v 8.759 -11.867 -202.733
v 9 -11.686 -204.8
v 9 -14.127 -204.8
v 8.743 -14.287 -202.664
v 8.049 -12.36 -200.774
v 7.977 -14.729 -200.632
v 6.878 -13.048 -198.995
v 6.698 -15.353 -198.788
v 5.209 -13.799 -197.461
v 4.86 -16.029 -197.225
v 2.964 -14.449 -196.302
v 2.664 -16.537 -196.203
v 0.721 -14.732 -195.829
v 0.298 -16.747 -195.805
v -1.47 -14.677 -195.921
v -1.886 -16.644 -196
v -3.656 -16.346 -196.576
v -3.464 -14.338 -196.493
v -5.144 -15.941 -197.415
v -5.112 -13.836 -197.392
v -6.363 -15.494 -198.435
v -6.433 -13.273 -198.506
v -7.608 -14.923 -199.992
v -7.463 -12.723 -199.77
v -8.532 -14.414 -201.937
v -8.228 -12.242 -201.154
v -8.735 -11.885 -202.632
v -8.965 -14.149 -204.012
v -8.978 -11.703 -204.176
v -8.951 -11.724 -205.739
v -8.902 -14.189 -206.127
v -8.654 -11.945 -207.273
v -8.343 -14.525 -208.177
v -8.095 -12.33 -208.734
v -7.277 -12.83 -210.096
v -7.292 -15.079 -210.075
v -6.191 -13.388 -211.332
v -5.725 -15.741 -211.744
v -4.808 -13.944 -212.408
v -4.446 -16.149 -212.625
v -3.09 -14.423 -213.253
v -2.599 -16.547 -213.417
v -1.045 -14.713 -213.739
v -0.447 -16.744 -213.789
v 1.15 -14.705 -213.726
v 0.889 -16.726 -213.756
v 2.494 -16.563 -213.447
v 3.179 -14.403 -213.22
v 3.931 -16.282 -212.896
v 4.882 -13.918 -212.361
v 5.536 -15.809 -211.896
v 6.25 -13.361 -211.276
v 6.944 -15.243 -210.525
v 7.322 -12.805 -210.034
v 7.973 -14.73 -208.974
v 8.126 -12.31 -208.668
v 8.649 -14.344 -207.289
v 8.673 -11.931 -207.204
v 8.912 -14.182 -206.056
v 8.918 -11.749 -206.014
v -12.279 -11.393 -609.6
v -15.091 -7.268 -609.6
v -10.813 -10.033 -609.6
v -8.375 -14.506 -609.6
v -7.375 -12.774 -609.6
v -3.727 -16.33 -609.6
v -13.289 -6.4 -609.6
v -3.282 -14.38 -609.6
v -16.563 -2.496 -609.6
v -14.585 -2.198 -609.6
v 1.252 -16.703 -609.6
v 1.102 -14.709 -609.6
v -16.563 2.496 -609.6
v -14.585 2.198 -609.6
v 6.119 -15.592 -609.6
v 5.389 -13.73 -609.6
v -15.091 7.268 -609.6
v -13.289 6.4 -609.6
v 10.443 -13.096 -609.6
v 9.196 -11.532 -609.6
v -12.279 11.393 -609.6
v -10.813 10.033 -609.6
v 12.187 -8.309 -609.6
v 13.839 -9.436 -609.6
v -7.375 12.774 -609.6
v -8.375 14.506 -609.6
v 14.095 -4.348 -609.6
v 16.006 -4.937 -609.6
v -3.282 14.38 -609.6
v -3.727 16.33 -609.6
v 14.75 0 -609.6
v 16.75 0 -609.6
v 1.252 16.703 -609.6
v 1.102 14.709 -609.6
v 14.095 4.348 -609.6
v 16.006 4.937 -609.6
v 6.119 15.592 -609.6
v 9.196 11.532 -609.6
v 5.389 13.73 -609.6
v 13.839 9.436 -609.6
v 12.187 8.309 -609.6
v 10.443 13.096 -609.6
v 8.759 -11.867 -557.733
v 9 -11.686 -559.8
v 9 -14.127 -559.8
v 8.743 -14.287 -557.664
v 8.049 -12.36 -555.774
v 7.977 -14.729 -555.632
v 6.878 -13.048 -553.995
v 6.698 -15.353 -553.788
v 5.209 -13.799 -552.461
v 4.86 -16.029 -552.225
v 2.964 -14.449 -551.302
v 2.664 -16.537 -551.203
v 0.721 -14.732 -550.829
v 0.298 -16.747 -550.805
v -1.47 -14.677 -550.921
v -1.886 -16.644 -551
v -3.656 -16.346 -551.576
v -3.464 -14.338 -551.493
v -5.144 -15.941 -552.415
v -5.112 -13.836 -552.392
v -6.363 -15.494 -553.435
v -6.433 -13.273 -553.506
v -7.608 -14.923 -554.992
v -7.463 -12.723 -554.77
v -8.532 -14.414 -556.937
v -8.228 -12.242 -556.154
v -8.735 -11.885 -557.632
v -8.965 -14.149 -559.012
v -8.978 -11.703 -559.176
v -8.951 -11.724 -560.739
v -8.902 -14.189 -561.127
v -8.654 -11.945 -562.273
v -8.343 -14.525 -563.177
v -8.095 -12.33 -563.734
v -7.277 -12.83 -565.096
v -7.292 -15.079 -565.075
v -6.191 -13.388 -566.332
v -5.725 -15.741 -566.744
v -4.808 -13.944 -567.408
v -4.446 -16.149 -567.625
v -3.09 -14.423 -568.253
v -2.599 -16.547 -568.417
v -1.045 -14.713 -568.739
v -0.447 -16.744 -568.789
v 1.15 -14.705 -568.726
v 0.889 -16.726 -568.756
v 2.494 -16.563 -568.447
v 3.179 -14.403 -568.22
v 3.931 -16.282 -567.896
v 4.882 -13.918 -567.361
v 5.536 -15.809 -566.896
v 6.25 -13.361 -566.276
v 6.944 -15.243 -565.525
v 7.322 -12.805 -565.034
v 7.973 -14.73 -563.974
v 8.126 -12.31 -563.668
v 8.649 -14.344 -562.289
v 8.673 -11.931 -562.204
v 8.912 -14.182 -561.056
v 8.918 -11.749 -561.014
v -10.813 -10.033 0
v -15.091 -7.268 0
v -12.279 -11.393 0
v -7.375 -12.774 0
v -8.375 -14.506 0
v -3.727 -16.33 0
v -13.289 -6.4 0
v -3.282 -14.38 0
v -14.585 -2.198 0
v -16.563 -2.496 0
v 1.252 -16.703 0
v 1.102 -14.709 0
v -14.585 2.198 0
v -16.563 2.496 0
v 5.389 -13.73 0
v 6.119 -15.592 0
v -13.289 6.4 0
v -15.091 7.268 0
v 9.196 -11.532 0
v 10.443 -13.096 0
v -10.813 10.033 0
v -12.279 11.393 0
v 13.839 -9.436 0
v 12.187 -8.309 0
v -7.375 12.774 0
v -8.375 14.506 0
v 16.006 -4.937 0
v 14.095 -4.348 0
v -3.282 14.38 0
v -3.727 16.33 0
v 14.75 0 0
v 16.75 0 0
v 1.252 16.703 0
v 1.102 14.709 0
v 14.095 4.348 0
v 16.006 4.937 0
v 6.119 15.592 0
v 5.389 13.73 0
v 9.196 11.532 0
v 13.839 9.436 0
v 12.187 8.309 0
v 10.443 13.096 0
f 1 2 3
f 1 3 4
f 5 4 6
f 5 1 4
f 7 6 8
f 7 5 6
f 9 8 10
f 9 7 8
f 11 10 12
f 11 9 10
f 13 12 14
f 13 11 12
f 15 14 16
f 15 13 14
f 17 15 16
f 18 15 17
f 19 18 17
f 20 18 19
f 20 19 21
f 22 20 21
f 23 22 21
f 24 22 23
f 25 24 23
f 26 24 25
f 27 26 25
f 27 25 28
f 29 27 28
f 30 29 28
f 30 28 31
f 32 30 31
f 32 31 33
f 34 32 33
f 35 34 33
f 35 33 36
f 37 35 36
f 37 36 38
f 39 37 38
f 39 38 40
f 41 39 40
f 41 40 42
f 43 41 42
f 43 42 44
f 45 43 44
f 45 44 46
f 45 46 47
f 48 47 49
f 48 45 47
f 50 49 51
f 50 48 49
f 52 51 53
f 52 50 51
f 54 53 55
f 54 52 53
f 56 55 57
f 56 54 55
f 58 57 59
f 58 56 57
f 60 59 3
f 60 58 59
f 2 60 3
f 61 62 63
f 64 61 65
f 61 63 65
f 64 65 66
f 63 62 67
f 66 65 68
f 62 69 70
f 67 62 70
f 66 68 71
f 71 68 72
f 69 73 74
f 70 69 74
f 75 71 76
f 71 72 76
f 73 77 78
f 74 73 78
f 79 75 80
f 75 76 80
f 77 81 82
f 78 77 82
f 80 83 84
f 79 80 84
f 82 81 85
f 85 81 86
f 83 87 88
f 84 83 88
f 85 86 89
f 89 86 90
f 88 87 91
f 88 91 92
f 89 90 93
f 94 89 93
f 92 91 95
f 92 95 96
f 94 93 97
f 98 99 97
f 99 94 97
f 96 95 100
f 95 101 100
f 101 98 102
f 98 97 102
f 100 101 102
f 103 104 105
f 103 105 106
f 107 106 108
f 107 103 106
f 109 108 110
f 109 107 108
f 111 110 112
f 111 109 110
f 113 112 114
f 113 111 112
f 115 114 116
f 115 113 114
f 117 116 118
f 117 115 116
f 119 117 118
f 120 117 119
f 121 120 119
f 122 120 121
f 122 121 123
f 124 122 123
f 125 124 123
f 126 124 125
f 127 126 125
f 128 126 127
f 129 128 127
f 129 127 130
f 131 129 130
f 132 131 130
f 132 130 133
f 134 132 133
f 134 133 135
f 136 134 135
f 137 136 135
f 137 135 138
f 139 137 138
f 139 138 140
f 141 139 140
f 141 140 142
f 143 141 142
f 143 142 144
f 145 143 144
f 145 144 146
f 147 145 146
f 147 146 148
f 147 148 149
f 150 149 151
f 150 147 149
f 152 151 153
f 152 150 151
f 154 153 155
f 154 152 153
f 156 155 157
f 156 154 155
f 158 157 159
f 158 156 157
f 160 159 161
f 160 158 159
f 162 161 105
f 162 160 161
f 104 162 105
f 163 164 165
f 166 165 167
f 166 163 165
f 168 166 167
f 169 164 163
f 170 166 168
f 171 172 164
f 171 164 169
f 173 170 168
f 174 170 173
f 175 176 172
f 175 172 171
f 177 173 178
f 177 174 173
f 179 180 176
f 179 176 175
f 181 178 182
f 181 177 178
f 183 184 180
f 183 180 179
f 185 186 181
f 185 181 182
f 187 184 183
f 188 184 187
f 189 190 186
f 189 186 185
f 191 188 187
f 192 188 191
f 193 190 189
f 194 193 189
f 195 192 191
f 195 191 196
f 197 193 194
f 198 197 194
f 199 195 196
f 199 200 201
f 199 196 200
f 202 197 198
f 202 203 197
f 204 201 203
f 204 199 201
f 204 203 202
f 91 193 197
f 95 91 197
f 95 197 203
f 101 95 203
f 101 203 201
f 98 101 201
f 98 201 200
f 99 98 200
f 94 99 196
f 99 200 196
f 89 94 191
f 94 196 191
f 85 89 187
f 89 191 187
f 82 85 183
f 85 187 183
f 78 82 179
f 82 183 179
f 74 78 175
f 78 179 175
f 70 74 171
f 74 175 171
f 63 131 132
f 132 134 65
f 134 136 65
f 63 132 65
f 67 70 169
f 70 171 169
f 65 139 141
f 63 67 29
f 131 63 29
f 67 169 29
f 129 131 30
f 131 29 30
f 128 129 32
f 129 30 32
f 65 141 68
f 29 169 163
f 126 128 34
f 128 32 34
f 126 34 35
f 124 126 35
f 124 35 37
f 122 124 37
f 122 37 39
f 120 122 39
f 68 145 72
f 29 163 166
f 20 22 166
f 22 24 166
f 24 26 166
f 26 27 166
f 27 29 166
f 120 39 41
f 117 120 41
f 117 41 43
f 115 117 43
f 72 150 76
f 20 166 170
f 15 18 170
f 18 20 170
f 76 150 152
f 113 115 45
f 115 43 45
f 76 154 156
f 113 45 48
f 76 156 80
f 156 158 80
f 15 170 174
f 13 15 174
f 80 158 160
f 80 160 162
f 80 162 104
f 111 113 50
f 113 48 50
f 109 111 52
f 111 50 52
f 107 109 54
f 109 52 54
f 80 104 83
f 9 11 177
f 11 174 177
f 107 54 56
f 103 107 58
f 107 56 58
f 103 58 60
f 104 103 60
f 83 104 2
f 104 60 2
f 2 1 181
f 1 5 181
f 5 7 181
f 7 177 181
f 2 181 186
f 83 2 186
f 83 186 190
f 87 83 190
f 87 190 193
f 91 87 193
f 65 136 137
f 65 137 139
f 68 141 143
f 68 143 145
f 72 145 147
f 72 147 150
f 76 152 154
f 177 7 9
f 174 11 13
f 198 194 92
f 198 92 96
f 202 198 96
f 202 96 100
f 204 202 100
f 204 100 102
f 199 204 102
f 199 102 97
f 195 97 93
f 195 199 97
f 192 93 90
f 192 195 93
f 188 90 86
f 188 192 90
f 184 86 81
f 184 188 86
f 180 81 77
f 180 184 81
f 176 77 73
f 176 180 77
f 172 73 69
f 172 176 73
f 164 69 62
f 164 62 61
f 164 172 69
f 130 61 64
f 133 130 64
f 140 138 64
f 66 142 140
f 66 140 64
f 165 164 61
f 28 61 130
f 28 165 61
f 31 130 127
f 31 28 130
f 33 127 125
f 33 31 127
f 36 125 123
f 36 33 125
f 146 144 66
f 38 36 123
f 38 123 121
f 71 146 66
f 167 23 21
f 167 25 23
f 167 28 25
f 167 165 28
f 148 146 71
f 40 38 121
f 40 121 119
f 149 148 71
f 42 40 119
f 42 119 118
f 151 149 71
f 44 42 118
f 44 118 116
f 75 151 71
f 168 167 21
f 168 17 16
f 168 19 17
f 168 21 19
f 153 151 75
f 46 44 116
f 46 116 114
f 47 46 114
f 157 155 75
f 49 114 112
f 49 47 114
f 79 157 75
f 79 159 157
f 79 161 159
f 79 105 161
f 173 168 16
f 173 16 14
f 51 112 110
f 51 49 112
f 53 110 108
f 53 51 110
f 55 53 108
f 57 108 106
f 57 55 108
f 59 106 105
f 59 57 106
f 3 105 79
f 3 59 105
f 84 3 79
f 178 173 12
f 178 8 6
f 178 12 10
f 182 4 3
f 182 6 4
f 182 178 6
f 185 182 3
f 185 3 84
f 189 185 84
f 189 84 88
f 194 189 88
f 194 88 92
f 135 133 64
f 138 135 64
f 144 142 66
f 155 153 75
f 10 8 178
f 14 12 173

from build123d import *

# Parameters (mm, degrees)
F0_R     = 16.75
F1_DEPTH = 609.6
F2_R     = 14.75
F3_DEPTH = 609.6
F4_R     = 9
F6_DEPTH = 25
F5_R     = 9
F7_DEPTH = 25


with BuildPart() as f1:
    # F0 (on Top) → F1 (new body)
    with BuildSketch(Plane.XY):
        Circle(F0_R)
    extrude(amount=-F1_DEPTH)

    # F2 (on Top) → F3 (cut)
    with BuildSketch(Plane.XY):
        Circle(F2_R)
    extrude(amount=-F3_DEPTH, mode=Mode.SUBTRACT)

    # F4 (on Front) → F6 (cut)
    with BuildSketch(Plane.XZ):
        with Locations((0, -204.8)):
            Circle(F4_R)
    extrude(amount=F6_DEPTH, mode=Mode.SUBTRACT)

    # F5 (on Front) → F7 (cut)
    with BuildSketch(Plane.XZ):
        with Locations((0, -559.8)):
            Circle(F5_R)
    extrude(amount=F7_DEPTH, mode=Mode.SUBTRACT)


solid = f1.part
